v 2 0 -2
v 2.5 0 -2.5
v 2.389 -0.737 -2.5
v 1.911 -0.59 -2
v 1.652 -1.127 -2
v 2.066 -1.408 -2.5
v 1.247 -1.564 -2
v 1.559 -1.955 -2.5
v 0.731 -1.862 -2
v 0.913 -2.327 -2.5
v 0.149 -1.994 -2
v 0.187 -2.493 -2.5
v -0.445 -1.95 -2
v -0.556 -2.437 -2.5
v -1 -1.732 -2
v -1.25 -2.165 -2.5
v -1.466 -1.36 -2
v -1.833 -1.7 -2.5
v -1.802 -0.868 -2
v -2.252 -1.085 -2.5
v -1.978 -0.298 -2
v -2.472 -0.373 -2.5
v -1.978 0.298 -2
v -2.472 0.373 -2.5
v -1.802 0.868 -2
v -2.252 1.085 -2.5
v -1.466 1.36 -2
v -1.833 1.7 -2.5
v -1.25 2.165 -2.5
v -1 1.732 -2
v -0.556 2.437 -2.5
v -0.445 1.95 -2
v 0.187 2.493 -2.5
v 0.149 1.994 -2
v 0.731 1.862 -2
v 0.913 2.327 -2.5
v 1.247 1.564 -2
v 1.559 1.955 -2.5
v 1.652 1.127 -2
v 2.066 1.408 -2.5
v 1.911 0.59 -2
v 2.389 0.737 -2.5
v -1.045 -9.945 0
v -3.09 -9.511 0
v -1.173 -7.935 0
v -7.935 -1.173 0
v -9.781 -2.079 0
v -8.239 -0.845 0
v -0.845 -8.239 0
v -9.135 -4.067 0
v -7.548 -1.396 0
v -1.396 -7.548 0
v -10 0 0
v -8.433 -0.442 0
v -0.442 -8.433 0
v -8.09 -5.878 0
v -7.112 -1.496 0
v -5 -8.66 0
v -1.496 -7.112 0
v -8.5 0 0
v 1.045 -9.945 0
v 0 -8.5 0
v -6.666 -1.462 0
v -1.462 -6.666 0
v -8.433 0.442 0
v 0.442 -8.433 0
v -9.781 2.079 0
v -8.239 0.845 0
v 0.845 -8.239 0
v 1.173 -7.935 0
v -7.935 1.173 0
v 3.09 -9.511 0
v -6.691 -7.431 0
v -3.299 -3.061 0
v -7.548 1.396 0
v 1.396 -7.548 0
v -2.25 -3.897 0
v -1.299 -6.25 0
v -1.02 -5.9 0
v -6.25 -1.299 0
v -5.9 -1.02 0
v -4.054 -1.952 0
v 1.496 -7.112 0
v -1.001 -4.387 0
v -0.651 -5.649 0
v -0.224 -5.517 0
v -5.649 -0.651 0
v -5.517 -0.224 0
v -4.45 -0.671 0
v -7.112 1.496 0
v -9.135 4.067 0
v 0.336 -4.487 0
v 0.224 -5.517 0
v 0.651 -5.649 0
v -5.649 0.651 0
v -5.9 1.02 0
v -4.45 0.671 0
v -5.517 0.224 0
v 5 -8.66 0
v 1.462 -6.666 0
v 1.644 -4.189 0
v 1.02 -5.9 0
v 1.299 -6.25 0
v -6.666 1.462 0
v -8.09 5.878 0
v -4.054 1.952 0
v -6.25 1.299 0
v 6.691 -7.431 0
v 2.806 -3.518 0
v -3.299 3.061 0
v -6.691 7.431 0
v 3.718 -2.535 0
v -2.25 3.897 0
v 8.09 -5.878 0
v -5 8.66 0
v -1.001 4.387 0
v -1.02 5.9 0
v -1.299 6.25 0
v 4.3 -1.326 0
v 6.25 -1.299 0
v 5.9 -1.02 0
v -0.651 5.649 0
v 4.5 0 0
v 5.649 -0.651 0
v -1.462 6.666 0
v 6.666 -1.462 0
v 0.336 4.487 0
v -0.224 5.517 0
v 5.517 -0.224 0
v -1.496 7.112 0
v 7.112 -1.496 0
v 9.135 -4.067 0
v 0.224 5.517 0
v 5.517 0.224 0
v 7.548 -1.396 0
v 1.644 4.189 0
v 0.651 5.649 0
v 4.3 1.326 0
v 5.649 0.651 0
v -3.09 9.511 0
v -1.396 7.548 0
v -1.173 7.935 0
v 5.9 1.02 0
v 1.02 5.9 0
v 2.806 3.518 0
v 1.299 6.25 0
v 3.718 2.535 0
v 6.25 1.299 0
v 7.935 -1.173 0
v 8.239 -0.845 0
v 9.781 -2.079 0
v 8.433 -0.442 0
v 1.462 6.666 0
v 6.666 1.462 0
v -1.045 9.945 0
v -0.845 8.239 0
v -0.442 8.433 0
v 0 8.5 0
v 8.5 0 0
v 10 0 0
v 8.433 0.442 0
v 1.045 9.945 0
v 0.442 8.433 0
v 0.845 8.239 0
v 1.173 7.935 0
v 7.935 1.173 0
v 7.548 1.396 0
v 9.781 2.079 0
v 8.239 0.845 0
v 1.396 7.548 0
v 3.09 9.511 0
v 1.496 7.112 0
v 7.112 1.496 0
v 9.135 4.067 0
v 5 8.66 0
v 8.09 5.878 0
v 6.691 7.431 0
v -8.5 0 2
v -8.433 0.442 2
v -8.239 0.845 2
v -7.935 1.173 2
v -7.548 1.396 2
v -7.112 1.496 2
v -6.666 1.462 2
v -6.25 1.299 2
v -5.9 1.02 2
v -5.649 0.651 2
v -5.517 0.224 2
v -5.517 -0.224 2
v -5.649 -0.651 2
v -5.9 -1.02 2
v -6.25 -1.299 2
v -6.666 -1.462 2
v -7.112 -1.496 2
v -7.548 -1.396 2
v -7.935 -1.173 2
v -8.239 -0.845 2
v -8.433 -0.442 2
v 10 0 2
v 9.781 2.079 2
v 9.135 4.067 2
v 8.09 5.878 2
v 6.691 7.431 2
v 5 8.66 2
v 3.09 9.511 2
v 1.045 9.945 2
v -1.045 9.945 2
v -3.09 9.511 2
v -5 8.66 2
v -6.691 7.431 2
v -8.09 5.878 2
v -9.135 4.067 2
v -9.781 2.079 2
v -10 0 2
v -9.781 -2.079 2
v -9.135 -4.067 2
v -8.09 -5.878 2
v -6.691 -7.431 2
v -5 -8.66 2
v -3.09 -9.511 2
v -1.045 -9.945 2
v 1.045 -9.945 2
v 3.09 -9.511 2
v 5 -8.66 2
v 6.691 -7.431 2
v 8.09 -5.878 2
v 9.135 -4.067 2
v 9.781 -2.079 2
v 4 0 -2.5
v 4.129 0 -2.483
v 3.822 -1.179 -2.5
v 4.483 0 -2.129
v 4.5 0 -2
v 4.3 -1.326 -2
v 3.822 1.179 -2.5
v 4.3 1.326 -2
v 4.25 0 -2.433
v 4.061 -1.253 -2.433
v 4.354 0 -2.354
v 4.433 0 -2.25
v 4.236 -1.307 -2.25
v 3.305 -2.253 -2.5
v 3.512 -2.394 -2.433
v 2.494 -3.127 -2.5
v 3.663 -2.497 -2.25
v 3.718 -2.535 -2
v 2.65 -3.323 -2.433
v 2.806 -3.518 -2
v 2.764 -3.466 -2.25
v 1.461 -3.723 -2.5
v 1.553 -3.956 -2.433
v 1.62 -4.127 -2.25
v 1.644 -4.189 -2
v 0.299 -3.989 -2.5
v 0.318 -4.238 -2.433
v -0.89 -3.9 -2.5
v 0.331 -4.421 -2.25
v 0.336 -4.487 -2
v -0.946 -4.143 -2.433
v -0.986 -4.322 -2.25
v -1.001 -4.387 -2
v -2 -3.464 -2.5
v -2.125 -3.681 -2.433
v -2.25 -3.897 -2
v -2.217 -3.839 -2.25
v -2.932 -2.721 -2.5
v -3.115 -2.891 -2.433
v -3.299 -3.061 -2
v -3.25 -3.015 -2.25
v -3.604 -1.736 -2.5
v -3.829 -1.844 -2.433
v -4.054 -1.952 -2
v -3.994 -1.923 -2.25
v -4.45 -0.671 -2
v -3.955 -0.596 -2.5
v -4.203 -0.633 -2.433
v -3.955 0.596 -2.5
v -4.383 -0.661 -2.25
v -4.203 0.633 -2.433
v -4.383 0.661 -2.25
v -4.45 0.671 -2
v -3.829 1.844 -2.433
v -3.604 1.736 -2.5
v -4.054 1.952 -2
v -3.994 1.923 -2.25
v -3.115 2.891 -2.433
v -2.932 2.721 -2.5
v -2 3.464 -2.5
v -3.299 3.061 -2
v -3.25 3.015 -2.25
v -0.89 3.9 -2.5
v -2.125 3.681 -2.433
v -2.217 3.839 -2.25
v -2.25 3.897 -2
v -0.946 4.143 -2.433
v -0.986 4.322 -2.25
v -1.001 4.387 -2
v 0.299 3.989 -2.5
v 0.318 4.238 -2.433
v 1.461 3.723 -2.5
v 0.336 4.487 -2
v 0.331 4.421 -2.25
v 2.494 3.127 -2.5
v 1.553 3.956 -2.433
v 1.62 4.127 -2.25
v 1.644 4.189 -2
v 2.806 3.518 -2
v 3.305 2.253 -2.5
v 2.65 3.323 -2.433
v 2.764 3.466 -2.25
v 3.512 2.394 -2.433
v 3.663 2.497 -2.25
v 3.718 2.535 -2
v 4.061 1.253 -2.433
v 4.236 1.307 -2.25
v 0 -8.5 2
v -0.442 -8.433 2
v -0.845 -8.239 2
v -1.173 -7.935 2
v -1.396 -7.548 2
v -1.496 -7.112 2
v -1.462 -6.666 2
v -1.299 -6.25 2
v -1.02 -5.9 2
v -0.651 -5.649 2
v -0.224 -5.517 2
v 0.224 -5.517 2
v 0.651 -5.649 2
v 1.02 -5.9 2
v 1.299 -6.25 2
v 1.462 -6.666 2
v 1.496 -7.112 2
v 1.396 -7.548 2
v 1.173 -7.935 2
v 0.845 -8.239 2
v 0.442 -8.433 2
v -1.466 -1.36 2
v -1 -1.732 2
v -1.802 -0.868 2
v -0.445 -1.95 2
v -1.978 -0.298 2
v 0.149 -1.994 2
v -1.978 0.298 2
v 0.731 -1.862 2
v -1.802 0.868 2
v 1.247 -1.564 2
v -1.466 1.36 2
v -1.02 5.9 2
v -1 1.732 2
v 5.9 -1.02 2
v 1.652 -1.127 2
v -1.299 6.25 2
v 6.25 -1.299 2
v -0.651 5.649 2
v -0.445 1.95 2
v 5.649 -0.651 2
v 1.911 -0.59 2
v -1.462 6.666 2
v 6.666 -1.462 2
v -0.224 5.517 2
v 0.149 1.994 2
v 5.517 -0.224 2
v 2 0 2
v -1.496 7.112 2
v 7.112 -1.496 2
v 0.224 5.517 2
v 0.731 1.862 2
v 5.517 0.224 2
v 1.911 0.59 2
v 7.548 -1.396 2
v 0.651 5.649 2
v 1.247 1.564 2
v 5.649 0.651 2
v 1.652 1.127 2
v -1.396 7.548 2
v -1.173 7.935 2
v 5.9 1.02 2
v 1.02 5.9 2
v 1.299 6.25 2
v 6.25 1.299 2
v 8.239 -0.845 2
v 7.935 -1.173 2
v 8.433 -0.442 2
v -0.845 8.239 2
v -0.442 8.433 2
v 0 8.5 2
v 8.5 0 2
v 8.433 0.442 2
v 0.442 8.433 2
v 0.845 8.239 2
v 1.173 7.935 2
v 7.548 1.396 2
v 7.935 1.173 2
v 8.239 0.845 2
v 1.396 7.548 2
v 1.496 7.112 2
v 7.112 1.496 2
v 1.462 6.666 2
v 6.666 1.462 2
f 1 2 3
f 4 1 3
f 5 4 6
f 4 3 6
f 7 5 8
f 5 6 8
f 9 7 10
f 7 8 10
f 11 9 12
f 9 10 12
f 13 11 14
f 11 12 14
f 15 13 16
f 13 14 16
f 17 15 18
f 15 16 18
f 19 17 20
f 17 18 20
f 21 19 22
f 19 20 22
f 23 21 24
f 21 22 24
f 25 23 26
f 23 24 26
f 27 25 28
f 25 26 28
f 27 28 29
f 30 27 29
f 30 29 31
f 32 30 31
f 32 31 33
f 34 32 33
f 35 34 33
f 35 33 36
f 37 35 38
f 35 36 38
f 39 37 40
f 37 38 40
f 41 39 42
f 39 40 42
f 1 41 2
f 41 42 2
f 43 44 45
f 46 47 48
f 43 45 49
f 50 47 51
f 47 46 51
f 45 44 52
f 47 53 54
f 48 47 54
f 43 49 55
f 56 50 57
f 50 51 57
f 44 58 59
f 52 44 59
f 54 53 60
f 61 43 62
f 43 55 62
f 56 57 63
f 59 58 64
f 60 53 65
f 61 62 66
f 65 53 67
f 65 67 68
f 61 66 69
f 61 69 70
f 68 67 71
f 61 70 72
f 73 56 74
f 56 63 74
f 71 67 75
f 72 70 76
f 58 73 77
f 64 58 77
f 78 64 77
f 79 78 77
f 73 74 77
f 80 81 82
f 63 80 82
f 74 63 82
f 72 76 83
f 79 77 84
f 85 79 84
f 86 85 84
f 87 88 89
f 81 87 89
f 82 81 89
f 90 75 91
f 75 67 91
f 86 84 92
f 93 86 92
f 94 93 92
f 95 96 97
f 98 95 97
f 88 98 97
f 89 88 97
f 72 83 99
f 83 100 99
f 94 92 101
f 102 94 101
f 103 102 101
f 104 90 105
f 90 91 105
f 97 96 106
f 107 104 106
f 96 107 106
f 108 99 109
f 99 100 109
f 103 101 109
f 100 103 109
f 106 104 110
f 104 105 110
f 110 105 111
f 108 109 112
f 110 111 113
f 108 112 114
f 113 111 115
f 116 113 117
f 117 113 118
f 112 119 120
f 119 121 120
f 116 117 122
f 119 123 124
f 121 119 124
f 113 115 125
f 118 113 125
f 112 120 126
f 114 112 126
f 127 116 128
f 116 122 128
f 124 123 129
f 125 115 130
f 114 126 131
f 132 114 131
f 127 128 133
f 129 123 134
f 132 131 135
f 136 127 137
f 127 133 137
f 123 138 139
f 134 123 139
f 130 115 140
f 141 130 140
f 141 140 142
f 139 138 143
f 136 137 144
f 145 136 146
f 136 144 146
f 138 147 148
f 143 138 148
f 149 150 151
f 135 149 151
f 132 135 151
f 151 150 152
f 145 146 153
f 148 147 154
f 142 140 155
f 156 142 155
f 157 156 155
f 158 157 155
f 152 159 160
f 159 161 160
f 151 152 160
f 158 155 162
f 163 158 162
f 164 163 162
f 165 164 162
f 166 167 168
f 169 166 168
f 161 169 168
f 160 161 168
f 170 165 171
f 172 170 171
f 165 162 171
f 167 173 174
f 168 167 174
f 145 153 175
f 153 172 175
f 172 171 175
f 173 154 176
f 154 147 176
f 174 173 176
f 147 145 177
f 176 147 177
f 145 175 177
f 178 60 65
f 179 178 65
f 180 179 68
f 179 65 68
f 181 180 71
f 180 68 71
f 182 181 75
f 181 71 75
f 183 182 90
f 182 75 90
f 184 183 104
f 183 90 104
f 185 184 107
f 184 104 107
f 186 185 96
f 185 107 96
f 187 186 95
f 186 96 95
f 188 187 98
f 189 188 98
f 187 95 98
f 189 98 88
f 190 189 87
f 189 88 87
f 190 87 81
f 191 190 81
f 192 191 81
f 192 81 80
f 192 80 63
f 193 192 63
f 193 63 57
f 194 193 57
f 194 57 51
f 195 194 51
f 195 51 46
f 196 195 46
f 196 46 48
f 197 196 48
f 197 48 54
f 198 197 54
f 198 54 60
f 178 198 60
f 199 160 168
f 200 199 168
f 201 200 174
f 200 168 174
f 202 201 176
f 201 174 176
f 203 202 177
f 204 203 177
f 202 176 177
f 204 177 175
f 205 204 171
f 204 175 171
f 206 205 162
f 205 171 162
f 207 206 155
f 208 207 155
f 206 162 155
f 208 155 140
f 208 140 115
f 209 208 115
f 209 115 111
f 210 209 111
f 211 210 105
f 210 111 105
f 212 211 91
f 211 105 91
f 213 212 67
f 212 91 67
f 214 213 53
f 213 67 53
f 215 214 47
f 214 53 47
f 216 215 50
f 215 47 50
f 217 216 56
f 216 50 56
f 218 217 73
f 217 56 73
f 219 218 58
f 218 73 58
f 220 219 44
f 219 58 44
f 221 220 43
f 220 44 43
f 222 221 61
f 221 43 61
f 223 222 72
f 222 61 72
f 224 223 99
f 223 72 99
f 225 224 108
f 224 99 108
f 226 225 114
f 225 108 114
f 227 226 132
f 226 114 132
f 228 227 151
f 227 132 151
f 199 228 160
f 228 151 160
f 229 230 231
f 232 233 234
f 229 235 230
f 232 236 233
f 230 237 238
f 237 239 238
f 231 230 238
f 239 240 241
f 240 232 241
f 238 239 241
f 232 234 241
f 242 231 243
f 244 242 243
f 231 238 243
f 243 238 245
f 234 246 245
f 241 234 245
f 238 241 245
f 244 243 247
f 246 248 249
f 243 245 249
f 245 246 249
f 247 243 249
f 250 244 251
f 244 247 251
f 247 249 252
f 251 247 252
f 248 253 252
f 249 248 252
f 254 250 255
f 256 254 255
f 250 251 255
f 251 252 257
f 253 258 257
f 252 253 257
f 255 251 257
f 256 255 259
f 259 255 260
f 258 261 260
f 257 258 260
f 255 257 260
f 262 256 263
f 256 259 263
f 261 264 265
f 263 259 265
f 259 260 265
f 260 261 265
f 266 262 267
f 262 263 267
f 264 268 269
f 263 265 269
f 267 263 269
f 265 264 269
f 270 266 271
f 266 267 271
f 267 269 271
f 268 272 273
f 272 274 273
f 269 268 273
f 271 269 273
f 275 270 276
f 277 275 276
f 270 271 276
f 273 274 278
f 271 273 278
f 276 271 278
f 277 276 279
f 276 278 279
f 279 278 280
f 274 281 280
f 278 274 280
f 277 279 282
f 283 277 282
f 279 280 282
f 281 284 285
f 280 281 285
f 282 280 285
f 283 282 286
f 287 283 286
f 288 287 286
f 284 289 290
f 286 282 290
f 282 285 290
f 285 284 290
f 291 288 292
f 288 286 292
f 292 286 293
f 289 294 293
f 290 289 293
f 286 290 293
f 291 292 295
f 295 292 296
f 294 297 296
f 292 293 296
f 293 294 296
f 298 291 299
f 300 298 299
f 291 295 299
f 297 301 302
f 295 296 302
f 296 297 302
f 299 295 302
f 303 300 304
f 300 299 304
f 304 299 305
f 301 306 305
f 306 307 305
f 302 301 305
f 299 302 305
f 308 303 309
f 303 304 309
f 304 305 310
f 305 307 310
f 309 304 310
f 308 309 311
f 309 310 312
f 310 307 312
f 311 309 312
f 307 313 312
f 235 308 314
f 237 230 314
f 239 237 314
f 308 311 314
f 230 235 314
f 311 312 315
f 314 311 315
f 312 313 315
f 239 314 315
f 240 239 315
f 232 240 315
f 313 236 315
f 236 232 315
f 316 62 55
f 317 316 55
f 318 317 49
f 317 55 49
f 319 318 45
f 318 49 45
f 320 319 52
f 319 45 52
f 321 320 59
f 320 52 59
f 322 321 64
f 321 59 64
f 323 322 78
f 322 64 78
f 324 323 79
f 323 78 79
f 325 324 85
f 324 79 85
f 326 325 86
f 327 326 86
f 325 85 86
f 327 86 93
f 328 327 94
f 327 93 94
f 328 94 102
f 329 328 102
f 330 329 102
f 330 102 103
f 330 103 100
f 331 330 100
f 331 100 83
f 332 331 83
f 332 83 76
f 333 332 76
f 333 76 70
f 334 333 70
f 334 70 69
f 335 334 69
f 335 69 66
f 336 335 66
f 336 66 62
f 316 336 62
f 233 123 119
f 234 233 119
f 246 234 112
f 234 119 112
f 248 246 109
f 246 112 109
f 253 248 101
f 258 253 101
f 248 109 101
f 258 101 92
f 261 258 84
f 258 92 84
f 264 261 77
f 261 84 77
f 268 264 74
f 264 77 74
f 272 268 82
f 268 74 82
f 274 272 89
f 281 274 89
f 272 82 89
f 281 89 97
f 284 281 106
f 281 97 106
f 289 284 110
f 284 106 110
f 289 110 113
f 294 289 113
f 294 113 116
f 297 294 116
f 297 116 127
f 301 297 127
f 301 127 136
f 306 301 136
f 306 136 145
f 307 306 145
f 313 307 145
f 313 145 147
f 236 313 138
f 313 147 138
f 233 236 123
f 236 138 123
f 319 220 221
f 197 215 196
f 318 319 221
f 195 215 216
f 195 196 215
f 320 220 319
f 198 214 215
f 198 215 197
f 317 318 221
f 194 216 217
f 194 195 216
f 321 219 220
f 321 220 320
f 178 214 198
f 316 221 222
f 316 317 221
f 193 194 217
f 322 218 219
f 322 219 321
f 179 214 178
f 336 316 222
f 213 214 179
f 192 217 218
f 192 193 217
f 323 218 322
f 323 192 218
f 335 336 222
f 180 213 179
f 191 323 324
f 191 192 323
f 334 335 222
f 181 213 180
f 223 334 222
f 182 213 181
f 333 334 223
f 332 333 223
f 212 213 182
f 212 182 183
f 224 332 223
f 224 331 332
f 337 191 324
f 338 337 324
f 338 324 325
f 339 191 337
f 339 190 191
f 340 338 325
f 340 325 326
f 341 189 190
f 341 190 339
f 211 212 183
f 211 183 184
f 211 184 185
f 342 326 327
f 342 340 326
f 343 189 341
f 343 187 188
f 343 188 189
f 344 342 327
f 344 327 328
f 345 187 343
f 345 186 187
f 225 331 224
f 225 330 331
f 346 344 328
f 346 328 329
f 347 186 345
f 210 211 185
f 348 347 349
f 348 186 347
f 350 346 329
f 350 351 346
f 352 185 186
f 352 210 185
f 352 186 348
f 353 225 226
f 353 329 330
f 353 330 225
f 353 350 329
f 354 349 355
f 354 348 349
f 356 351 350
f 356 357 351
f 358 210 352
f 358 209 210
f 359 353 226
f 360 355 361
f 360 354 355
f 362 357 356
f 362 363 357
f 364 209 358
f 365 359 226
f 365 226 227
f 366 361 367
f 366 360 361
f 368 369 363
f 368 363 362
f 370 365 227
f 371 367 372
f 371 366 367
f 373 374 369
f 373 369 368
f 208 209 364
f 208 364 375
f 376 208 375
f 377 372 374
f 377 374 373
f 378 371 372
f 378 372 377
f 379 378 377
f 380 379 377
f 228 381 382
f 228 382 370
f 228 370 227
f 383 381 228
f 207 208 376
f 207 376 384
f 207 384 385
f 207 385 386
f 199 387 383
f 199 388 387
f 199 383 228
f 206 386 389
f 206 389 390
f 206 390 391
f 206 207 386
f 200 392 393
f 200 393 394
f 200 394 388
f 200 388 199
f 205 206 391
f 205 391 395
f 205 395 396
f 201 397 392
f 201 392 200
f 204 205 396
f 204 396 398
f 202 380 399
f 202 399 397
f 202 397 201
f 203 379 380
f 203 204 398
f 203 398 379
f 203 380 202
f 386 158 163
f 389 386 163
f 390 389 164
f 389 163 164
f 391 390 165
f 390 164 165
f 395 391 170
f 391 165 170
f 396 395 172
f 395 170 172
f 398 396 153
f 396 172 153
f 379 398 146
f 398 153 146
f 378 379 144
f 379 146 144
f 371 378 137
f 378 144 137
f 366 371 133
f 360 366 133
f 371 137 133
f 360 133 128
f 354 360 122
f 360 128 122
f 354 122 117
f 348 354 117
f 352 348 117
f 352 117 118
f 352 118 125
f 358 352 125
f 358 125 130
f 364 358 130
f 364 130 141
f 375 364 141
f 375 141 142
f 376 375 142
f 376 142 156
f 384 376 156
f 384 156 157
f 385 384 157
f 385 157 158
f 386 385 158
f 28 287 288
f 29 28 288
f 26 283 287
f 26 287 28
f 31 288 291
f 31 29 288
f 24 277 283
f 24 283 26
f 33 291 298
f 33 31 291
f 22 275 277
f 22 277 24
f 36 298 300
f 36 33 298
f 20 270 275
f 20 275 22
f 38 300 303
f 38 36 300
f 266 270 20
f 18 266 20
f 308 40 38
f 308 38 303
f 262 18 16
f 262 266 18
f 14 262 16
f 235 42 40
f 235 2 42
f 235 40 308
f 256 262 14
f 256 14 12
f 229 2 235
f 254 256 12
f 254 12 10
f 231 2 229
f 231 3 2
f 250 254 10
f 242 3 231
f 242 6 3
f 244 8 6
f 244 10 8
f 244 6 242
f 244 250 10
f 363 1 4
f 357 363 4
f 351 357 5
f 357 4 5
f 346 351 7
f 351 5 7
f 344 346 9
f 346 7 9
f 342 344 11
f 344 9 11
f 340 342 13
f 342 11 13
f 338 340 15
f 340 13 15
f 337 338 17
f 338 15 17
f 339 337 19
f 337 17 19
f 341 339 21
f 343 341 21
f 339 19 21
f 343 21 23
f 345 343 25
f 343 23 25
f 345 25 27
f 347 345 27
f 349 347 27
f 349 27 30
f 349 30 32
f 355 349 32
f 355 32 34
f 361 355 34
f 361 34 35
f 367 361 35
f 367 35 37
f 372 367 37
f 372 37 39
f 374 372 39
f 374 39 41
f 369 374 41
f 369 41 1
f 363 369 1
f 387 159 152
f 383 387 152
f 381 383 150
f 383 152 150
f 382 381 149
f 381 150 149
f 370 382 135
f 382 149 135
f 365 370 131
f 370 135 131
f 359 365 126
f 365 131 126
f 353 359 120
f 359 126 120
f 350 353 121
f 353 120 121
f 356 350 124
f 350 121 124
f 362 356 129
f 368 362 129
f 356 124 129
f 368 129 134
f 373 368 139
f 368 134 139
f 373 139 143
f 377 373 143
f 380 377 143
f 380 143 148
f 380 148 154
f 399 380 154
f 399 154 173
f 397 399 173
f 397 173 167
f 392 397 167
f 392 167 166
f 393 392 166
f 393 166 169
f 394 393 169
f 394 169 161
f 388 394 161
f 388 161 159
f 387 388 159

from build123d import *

# Parameters (mm, degrees)
SKETCH011_R        = 10
PAD008_DEPTH       = 2
SKETCH012_R        = 4.5
PAD009_DEPTH       = 2.5
SKETCH013_R        = 2
POCKET003_DEPTH    = 4.501
CHAMFER004_SIZE    = 0.5
FILLET011_R        = 0.5
SKETCH014_R        = 1.5
POCKET004_DEPTH    = 59.281014
POLARPATTERN_COUNT = 4


with BuildPart() as part:
    # Sketch011 → Pad008 (new body)
    with BuildSketch(Plane.XY):
        Circle(SKETCH011_R)
    extrude(amount=PAD008_DEPTH)

    # Sketch012 (on Face2 of Pad008) → Pad009 (join)
    with BuildSketch(Plane(origin=(0, 0, 0), x_dir=(1, 0, 0), z_dir=(0, 0, -1))):
        Circle(SKETCH012_R)
    extrude(amount=PAD009_DEPTH)

    # Sketch013 (on Face5 of Pad009) → Pocket003 (cut, through all)
    with BuildSketch(Plane(origin=(0, 0, -2.5), x_dir=(1, 0, 0), z_dir=(0, 0, -1))):
        Circle(SKETCH013_R)
    extrude(amount=-POCKET003_DEPTH, mode=Mode.SUBTRACT)

    # Chamfer004
    chamfer004_edges = [part.edges().sort_by_distance(p)[0] for p in [
        (-2, 0, -2.5),
    ]]
    chamfer(chamfer004_edges, length=CHAMFER004_SIZE)

    # Fillet011
    fillet011_edges = [part.edges().sort_by_distance(p)[0] for p in [
        (-4.5, 0, -2.5),
    ]]
    fillet(fillet011_edges, radius=FILLET011_R)

    # Sketch014 (on Face6 of Fillet011) → Pocket004 (cut, through all)
    with BuildSketch(Plane(origin=(0, 0, 0), x_dir=(1, 0, 0), z_dir=(0, 0, -1))):
        with Locations((7, 0)):
            Circle(SKETCH014_R)
    pocket004 = extrude(amount=-POCKET004_DEPTH, mode=Mode.SUBTRACT)

    # PolarPattern: Pocket004 ×4 about axis
    polarpattern_axis = Axis((0, 0, 0), (0, 0, -1))
    for i in range(1, POLARPATTERN_COUNT):
        add(pocket004.rotate(polarpattern_axis, i * 360 / POLARPATTERN_COUNT), mode=Mode.SUBTRACT)


solid = part.part
